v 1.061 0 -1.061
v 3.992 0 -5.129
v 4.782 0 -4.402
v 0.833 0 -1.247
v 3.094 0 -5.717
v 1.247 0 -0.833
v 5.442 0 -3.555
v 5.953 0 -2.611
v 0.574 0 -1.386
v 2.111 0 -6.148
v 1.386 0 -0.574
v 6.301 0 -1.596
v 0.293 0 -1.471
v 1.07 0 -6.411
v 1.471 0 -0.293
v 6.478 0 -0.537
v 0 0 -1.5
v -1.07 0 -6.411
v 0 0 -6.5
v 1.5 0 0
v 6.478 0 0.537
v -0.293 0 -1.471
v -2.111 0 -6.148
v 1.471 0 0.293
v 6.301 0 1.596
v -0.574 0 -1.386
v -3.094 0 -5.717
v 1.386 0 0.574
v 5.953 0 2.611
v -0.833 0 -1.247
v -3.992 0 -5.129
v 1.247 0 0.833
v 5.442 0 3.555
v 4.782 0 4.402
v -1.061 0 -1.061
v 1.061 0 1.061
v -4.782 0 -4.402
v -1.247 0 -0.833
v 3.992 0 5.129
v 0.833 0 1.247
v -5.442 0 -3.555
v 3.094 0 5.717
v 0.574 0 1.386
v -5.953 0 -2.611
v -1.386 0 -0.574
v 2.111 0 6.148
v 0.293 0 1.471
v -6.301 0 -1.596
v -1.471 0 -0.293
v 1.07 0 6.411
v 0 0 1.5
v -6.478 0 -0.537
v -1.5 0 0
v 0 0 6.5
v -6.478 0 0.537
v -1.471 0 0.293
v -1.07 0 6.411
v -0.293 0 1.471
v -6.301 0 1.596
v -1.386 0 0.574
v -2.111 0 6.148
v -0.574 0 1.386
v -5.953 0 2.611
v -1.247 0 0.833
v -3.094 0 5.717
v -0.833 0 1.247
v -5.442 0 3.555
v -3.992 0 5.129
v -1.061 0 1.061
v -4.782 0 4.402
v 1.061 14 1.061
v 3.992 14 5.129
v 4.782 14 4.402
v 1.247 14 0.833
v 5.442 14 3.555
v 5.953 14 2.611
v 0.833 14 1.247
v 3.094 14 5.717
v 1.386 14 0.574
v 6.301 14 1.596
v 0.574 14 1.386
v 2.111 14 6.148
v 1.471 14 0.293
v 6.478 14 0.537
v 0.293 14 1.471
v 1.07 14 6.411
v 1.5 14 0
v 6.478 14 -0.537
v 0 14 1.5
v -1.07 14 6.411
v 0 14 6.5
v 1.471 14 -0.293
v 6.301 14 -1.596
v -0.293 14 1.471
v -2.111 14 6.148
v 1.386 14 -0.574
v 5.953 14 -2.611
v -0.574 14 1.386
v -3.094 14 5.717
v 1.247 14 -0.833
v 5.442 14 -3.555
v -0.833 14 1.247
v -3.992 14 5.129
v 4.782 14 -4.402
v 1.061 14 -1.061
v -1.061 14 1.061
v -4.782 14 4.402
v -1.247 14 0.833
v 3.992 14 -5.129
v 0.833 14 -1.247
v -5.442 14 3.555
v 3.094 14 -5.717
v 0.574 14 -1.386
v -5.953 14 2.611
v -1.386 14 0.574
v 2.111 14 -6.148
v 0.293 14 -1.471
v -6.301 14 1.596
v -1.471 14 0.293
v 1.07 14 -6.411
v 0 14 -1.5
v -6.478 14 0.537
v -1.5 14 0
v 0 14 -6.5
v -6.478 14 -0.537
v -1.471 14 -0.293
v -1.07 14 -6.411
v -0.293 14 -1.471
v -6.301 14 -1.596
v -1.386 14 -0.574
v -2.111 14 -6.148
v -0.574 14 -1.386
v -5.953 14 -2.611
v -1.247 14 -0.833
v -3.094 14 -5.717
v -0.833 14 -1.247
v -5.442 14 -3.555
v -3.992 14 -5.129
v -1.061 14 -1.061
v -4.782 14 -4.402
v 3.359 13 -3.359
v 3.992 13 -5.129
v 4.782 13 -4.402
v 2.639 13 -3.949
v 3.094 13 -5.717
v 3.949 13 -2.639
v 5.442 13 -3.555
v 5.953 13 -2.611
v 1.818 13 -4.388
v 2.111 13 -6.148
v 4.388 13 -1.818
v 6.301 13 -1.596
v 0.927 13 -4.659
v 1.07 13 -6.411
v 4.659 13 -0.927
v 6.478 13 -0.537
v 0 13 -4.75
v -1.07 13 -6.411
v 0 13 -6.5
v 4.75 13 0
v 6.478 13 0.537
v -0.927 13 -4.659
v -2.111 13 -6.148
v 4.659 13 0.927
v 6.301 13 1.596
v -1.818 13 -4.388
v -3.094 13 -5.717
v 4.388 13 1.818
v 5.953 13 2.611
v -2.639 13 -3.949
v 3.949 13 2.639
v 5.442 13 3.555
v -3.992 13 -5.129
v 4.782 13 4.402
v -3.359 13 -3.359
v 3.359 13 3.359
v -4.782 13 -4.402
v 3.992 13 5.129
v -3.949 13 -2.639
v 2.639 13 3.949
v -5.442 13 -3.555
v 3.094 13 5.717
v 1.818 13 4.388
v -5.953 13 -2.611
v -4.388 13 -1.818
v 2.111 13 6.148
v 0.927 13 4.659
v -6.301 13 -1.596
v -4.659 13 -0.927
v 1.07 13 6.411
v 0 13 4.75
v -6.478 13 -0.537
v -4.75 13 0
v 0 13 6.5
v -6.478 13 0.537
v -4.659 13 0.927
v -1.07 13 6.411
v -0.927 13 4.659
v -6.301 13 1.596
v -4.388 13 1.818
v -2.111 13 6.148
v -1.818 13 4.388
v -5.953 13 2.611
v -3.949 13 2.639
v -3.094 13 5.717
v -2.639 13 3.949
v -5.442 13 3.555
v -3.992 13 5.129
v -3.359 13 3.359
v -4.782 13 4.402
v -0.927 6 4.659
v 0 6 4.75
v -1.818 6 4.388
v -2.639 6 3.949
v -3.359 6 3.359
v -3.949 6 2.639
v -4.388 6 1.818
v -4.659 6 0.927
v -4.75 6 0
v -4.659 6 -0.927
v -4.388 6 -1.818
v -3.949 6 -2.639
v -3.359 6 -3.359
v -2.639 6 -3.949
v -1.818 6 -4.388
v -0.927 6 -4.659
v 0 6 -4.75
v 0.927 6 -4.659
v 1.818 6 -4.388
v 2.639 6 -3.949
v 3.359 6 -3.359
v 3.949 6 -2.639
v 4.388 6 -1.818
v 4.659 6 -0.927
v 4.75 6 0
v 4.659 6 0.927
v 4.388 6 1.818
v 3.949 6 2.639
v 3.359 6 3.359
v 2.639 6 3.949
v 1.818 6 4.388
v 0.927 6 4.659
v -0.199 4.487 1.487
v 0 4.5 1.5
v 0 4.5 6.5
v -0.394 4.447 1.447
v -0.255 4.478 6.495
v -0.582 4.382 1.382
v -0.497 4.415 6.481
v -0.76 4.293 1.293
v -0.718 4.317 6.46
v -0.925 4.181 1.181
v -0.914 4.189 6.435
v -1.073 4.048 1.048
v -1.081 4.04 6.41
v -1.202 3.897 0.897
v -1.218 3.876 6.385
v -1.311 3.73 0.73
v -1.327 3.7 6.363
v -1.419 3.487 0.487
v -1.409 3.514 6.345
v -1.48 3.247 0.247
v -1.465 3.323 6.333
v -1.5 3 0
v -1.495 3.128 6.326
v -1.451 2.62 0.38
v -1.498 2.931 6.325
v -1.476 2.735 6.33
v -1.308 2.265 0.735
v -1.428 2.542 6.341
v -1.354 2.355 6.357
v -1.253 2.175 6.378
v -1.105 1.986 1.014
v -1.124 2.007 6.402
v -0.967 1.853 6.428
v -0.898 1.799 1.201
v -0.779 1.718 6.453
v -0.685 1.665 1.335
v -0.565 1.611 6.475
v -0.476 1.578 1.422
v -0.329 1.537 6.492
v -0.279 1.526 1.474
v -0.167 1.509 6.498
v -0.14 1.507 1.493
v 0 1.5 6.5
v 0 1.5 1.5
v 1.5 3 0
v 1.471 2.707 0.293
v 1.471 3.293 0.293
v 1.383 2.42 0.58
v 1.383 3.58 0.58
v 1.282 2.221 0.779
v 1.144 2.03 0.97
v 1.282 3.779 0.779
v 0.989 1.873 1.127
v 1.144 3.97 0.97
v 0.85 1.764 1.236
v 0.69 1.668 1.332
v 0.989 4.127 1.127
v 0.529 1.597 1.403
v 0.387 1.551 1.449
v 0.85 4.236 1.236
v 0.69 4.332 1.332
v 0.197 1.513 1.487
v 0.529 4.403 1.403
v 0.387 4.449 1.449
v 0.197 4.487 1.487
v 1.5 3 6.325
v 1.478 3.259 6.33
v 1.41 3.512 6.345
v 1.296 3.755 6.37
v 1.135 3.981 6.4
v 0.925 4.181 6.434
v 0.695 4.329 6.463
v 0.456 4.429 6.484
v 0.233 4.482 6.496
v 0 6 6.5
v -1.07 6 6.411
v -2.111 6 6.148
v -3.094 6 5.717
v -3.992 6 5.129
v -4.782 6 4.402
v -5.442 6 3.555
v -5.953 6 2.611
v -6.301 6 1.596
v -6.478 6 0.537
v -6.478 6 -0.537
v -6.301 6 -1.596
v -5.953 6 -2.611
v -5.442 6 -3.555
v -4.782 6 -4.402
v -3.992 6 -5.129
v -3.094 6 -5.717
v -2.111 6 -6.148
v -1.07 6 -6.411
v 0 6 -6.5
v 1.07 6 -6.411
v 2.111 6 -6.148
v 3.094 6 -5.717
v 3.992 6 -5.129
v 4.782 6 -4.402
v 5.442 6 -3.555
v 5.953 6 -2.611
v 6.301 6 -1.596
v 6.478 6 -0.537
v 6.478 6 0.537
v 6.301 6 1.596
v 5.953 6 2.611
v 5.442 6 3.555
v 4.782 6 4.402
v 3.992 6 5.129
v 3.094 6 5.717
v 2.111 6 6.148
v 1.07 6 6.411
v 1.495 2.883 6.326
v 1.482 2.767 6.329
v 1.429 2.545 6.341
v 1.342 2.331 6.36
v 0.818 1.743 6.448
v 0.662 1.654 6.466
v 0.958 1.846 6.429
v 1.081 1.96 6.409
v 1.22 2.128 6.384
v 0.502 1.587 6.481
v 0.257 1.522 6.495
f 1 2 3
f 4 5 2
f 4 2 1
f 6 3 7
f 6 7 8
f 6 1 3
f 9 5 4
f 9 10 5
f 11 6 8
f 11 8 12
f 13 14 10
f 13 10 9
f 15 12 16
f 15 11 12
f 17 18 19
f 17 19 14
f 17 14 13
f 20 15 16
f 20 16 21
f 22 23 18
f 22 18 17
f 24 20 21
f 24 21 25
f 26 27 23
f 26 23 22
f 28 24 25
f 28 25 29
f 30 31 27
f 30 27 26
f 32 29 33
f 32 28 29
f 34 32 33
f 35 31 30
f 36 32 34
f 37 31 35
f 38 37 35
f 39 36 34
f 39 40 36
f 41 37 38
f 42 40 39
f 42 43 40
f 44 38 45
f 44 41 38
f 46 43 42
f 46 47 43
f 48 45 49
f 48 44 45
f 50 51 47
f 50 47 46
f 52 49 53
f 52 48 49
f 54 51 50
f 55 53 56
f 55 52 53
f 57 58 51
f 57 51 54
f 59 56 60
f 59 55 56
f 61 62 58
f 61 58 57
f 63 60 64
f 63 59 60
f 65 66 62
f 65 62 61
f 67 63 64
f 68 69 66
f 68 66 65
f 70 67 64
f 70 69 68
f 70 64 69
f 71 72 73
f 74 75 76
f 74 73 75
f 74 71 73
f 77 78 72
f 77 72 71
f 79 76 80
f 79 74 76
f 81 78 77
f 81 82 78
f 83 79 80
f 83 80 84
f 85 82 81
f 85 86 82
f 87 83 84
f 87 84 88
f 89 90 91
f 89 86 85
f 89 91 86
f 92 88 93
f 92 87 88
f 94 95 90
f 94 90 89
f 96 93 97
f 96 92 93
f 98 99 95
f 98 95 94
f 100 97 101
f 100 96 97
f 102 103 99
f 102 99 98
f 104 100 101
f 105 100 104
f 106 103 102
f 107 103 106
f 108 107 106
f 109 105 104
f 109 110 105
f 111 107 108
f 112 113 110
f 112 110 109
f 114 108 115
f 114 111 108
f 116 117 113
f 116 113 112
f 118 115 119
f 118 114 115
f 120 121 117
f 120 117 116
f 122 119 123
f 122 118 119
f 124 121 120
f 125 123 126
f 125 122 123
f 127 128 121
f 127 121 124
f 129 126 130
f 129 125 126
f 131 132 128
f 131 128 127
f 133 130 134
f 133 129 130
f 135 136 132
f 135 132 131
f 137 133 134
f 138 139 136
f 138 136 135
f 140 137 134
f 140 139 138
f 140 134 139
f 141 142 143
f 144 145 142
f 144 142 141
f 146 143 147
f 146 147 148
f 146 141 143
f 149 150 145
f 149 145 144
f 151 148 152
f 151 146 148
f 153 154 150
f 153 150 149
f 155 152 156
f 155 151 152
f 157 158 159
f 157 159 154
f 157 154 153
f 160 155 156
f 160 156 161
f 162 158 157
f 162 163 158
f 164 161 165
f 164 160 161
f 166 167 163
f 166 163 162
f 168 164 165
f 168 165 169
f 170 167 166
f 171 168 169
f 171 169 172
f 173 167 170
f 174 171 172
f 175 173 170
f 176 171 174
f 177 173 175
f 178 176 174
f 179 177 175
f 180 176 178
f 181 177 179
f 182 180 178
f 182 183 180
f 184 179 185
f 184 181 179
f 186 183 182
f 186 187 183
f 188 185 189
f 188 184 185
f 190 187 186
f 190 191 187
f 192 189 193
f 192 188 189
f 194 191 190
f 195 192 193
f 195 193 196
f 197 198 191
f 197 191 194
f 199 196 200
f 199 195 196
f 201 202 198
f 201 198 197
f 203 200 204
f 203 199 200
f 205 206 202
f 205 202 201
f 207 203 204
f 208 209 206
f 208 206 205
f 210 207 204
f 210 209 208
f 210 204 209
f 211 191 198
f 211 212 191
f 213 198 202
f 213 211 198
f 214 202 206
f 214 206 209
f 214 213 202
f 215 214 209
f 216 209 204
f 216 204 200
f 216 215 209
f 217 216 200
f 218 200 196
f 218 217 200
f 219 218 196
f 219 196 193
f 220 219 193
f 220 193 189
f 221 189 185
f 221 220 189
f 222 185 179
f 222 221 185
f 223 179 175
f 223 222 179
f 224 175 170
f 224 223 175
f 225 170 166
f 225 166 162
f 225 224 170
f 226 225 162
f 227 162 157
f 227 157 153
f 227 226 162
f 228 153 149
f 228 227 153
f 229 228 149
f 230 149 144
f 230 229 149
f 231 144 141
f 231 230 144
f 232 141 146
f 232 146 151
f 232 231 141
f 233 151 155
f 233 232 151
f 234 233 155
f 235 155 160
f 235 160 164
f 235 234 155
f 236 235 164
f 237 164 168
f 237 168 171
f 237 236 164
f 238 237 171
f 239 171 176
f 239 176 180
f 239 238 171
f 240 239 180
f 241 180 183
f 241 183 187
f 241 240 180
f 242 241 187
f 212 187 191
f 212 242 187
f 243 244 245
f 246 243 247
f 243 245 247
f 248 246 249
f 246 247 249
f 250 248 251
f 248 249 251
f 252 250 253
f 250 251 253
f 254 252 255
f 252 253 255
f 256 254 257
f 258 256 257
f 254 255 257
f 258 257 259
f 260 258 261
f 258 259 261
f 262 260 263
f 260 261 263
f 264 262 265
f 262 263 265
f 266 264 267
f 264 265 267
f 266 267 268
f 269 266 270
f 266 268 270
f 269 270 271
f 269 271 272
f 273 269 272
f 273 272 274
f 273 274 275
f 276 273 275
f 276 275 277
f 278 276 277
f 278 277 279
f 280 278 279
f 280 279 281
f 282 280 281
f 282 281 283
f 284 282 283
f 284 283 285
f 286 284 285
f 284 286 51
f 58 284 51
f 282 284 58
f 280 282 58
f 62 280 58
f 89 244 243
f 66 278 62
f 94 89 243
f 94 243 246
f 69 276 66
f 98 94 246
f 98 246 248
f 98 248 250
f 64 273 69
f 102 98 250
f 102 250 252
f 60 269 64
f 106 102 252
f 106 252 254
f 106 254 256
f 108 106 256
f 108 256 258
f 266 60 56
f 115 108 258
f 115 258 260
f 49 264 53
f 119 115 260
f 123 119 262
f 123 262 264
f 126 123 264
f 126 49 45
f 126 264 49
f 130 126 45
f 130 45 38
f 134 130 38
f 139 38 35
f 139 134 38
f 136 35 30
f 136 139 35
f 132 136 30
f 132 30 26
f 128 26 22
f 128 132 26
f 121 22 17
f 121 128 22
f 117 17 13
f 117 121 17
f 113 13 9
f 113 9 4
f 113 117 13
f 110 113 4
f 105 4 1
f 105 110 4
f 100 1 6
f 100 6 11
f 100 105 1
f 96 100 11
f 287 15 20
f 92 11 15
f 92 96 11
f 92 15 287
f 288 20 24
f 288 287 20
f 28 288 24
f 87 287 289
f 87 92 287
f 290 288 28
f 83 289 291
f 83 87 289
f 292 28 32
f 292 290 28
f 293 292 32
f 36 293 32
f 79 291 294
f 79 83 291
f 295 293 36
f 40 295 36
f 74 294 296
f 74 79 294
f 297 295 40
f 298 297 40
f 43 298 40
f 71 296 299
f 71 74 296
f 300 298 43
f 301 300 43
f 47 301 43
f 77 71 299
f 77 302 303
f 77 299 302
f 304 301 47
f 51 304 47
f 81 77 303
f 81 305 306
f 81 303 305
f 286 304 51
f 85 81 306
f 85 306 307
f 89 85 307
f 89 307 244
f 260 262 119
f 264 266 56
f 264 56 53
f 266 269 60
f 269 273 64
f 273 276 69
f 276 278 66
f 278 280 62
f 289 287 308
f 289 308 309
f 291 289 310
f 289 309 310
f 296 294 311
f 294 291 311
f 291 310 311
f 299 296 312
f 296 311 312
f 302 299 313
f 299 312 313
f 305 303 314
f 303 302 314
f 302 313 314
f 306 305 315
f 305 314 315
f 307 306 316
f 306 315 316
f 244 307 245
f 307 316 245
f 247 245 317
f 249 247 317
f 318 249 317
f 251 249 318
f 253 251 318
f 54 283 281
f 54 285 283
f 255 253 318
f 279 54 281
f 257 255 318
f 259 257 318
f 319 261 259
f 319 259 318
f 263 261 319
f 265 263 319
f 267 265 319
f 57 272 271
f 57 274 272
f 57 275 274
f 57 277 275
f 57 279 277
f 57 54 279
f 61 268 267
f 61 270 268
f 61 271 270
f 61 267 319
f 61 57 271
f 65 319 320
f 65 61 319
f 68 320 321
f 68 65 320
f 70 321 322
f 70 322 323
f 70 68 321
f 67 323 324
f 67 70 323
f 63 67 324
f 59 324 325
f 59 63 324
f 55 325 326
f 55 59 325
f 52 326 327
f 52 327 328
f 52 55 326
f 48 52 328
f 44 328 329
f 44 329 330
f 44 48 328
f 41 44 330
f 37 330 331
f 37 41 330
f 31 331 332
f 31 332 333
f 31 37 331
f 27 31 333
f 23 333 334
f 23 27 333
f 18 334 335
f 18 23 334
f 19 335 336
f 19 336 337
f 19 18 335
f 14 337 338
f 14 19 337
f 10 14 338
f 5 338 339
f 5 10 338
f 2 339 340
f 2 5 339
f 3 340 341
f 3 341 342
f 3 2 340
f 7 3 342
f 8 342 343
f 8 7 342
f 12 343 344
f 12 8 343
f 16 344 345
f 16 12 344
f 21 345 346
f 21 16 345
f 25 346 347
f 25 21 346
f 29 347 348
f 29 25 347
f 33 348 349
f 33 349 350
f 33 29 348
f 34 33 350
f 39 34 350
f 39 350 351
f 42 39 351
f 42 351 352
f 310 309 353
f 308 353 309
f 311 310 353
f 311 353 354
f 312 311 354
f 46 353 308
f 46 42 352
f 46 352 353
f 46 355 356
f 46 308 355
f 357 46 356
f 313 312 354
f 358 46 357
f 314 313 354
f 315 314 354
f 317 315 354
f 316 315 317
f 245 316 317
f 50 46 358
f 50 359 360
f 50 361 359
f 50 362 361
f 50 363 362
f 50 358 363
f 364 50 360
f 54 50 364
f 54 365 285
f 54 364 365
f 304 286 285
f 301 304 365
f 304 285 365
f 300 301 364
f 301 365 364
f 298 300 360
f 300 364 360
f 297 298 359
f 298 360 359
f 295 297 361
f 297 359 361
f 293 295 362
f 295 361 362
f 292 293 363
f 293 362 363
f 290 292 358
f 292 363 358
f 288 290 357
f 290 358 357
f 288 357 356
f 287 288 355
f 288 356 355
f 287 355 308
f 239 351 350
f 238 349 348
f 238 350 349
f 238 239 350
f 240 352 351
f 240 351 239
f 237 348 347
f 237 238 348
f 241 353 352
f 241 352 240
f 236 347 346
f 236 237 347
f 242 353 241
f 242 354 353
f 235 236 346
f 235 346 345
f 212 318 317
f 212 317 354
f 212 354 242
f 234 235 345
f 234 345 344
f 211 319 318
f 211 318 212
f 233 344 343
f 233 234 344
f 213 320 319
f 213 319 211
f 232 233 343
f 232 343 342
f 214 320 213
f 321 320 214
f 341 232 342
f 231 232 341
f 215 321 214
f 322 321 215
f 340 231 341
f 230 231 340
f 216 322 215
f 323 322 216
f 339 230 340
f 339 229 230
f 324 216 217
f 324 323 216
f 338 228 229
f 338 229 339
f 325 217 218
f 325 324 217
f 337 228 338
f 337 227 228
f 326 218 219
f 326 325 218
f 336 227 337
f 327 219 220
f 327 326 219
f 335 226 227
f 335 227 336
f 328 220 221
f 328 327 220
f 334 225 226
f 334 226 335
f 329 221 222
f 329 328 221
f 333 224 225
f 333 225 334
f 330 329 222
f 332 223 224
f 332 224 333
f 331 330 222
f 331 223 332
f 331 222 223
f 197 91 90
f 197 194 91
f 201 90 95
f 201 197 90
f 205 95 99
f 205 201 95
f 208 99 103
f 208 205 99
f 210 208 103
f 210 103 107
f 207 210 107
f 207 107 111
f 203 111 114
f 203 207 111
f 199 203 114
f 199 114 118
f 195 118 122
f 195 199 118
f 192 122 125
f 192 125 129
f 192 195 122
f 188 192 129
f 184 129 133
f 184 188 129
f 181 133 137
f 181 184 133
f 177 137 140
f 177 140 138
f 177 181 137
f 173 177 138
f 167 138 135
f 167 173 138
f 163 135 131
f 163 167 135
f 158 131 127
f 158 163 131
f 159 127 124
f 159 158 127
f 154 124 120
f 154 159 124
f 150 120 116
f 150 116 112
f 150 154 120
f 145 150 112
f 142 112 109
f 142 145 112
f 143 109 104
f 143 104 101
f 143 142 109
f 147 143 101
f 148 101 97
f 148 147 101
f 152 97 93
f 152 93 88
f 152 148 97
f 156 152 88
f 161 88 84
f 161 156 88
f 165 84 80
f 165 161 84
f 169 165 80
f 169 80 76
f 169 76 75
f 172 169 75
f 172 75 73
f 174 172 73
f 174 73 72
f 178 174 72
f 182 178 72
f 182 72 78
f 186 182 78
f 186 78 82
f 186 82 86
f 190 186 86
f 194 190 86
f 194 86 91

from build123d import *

# Parameters (mm, degrees)
CUT_EXTRUDE_1_REACH      = 22.18
CUT_EXTRUDE_1_END_RADIUS = 1.5


with BuildPart() as part:
    # 草图2 → 旋转1 (revolve)
    with BuildSketch(Plane.XY, mode=Mode.PRIVATE) as revolve_1_sk:
        Polygon((1.5, 14), (6.5, 14), (6.5, 13), (4.75, 13), (4.75, 6), (6.5, 6), (6.5, 0), (1.5, 0), align=None)
    revolve(revolve_1_sk.sketch.rotate(Axis((0, 66, 0), (0, -1, 0)), 90), axis=Axis((0, 66, 0), (0, -1, 0)))

    # 切除-拉伸1: up to this cylinder (the profile starts outside it)
    cut_extrude_1_end = Plane(origin=(0, 3, 0), z_dir=(0, 1, 0)) * Cylinder(CUT_EXTRUDE_1_END_RADIUS, 48.36, mode=Mode.PRIVATE)
    # 草图3 → 切除-拉伸1 (cut, up to the surface)
    with BuildSketch(Plane.XY.offset(6.5), mode=Mode.PRIVATE) as cut_extrude_1_sk1:
        with BuildLine():
            ThreePointArc((1.5, 3), (1.060660172, 4.060660172), (0, 4.5))
            Line((0, 4.5), (0, 1.5))
            ThreePointArc((0, 1.5), (1.060660172, 1.939339828), (1.5, 3))
        make_face()
    cut_extrude_1_tool1 = extrude(cut_extrude_1_sk1.sketch, amount=-CUT_EXTRUDE_1_REACH, mode=Mode.PRIVATE) - cut_extrude_1_end
    add(cut_extrude_1_tool1.solids().sort_by_distance((0.63662, 3, 6.5))[0], mode=Mode.SUBTRACT)
    # 草图3 → 切除-拉伸1 (cut, up to the surface)
    with BuildSketch(Plane.XY.offset(6.5), mode=Mode.PRIVATE) as cut_extrude_1_sk2:
        with BuildLine():
            Line((0, 1.5), (0, 4.5))
            ThreePointArc((0, 4.5), (-1.5, 3), (0, 1.5))
        make_face()
    cut_extrude_1_tool2 = extrude(cut_extrude_1_sk2.sketch, amount=-CUT_EXTRUDE_1_REACH, mode=Mode.PRIVATE) - cut_extrude_1_end
    add(cut_extrude_1_tool2.solids().sort_by_distance((-0.63662, 3, 6.5))[0], mode=Mode.SUBTRACT)
    # 草图3 → 切除-拉伸1 (cut, up to the surface)
    with BuildSketch(Plane.XY.offset(6.5), mode=Mode.PRIVATE) as cut_extrude_1_sk3:
        with BuildLine():
            ThreePointArc((1.5, 3), (1.060660172, 4.060660172), (0, 4.5))
            Line((0, 4.5), (0, 1.5))
            ThreePointArc((0, 1.5), (1.060660172, 1.939339828), (1.5, 3))
        make_face()
    cut_extrude_1_tool3 = extrude(cut_extrude_1_sk3.sketch, amount=-CUT_EXTRUDE_1_REACH, mode=Mode.PRIVATE) - cut_extrude_1_end
    add(cut_extrude_1_tool3.solids().sort_by_distance((0.63662, 3, 6.5))[0], mode=Mode.SUBTRACT)
    # 草图3 → 切除-拉伸1 (cut, up to the surface)
    with BuildSketch(Plane.XY.offset(6.5), mode=Mode.PRIVATE) as cut_extrude_1_sk4:
        with BuildLine():
            Line((0, 1.5), (0, 4.5))
            ThreePointArc((0, 4.5), (-1.5, 3), (0, 1.5))
        make_face()
    cut_extrude_1_tool4 = extrude(cut_extrude_1_sk4.sketch, amount=-CUT_EXTRUDE_1_REACH, mode=Mode.PRIVATE) - cut_extrude_1_end
    add(cut_extrude_1_tool4.solids().sort_by_distance((-0.63662, 3, 6.5))[0], mode=Mode.SUBTRACT)


solid = part.part
